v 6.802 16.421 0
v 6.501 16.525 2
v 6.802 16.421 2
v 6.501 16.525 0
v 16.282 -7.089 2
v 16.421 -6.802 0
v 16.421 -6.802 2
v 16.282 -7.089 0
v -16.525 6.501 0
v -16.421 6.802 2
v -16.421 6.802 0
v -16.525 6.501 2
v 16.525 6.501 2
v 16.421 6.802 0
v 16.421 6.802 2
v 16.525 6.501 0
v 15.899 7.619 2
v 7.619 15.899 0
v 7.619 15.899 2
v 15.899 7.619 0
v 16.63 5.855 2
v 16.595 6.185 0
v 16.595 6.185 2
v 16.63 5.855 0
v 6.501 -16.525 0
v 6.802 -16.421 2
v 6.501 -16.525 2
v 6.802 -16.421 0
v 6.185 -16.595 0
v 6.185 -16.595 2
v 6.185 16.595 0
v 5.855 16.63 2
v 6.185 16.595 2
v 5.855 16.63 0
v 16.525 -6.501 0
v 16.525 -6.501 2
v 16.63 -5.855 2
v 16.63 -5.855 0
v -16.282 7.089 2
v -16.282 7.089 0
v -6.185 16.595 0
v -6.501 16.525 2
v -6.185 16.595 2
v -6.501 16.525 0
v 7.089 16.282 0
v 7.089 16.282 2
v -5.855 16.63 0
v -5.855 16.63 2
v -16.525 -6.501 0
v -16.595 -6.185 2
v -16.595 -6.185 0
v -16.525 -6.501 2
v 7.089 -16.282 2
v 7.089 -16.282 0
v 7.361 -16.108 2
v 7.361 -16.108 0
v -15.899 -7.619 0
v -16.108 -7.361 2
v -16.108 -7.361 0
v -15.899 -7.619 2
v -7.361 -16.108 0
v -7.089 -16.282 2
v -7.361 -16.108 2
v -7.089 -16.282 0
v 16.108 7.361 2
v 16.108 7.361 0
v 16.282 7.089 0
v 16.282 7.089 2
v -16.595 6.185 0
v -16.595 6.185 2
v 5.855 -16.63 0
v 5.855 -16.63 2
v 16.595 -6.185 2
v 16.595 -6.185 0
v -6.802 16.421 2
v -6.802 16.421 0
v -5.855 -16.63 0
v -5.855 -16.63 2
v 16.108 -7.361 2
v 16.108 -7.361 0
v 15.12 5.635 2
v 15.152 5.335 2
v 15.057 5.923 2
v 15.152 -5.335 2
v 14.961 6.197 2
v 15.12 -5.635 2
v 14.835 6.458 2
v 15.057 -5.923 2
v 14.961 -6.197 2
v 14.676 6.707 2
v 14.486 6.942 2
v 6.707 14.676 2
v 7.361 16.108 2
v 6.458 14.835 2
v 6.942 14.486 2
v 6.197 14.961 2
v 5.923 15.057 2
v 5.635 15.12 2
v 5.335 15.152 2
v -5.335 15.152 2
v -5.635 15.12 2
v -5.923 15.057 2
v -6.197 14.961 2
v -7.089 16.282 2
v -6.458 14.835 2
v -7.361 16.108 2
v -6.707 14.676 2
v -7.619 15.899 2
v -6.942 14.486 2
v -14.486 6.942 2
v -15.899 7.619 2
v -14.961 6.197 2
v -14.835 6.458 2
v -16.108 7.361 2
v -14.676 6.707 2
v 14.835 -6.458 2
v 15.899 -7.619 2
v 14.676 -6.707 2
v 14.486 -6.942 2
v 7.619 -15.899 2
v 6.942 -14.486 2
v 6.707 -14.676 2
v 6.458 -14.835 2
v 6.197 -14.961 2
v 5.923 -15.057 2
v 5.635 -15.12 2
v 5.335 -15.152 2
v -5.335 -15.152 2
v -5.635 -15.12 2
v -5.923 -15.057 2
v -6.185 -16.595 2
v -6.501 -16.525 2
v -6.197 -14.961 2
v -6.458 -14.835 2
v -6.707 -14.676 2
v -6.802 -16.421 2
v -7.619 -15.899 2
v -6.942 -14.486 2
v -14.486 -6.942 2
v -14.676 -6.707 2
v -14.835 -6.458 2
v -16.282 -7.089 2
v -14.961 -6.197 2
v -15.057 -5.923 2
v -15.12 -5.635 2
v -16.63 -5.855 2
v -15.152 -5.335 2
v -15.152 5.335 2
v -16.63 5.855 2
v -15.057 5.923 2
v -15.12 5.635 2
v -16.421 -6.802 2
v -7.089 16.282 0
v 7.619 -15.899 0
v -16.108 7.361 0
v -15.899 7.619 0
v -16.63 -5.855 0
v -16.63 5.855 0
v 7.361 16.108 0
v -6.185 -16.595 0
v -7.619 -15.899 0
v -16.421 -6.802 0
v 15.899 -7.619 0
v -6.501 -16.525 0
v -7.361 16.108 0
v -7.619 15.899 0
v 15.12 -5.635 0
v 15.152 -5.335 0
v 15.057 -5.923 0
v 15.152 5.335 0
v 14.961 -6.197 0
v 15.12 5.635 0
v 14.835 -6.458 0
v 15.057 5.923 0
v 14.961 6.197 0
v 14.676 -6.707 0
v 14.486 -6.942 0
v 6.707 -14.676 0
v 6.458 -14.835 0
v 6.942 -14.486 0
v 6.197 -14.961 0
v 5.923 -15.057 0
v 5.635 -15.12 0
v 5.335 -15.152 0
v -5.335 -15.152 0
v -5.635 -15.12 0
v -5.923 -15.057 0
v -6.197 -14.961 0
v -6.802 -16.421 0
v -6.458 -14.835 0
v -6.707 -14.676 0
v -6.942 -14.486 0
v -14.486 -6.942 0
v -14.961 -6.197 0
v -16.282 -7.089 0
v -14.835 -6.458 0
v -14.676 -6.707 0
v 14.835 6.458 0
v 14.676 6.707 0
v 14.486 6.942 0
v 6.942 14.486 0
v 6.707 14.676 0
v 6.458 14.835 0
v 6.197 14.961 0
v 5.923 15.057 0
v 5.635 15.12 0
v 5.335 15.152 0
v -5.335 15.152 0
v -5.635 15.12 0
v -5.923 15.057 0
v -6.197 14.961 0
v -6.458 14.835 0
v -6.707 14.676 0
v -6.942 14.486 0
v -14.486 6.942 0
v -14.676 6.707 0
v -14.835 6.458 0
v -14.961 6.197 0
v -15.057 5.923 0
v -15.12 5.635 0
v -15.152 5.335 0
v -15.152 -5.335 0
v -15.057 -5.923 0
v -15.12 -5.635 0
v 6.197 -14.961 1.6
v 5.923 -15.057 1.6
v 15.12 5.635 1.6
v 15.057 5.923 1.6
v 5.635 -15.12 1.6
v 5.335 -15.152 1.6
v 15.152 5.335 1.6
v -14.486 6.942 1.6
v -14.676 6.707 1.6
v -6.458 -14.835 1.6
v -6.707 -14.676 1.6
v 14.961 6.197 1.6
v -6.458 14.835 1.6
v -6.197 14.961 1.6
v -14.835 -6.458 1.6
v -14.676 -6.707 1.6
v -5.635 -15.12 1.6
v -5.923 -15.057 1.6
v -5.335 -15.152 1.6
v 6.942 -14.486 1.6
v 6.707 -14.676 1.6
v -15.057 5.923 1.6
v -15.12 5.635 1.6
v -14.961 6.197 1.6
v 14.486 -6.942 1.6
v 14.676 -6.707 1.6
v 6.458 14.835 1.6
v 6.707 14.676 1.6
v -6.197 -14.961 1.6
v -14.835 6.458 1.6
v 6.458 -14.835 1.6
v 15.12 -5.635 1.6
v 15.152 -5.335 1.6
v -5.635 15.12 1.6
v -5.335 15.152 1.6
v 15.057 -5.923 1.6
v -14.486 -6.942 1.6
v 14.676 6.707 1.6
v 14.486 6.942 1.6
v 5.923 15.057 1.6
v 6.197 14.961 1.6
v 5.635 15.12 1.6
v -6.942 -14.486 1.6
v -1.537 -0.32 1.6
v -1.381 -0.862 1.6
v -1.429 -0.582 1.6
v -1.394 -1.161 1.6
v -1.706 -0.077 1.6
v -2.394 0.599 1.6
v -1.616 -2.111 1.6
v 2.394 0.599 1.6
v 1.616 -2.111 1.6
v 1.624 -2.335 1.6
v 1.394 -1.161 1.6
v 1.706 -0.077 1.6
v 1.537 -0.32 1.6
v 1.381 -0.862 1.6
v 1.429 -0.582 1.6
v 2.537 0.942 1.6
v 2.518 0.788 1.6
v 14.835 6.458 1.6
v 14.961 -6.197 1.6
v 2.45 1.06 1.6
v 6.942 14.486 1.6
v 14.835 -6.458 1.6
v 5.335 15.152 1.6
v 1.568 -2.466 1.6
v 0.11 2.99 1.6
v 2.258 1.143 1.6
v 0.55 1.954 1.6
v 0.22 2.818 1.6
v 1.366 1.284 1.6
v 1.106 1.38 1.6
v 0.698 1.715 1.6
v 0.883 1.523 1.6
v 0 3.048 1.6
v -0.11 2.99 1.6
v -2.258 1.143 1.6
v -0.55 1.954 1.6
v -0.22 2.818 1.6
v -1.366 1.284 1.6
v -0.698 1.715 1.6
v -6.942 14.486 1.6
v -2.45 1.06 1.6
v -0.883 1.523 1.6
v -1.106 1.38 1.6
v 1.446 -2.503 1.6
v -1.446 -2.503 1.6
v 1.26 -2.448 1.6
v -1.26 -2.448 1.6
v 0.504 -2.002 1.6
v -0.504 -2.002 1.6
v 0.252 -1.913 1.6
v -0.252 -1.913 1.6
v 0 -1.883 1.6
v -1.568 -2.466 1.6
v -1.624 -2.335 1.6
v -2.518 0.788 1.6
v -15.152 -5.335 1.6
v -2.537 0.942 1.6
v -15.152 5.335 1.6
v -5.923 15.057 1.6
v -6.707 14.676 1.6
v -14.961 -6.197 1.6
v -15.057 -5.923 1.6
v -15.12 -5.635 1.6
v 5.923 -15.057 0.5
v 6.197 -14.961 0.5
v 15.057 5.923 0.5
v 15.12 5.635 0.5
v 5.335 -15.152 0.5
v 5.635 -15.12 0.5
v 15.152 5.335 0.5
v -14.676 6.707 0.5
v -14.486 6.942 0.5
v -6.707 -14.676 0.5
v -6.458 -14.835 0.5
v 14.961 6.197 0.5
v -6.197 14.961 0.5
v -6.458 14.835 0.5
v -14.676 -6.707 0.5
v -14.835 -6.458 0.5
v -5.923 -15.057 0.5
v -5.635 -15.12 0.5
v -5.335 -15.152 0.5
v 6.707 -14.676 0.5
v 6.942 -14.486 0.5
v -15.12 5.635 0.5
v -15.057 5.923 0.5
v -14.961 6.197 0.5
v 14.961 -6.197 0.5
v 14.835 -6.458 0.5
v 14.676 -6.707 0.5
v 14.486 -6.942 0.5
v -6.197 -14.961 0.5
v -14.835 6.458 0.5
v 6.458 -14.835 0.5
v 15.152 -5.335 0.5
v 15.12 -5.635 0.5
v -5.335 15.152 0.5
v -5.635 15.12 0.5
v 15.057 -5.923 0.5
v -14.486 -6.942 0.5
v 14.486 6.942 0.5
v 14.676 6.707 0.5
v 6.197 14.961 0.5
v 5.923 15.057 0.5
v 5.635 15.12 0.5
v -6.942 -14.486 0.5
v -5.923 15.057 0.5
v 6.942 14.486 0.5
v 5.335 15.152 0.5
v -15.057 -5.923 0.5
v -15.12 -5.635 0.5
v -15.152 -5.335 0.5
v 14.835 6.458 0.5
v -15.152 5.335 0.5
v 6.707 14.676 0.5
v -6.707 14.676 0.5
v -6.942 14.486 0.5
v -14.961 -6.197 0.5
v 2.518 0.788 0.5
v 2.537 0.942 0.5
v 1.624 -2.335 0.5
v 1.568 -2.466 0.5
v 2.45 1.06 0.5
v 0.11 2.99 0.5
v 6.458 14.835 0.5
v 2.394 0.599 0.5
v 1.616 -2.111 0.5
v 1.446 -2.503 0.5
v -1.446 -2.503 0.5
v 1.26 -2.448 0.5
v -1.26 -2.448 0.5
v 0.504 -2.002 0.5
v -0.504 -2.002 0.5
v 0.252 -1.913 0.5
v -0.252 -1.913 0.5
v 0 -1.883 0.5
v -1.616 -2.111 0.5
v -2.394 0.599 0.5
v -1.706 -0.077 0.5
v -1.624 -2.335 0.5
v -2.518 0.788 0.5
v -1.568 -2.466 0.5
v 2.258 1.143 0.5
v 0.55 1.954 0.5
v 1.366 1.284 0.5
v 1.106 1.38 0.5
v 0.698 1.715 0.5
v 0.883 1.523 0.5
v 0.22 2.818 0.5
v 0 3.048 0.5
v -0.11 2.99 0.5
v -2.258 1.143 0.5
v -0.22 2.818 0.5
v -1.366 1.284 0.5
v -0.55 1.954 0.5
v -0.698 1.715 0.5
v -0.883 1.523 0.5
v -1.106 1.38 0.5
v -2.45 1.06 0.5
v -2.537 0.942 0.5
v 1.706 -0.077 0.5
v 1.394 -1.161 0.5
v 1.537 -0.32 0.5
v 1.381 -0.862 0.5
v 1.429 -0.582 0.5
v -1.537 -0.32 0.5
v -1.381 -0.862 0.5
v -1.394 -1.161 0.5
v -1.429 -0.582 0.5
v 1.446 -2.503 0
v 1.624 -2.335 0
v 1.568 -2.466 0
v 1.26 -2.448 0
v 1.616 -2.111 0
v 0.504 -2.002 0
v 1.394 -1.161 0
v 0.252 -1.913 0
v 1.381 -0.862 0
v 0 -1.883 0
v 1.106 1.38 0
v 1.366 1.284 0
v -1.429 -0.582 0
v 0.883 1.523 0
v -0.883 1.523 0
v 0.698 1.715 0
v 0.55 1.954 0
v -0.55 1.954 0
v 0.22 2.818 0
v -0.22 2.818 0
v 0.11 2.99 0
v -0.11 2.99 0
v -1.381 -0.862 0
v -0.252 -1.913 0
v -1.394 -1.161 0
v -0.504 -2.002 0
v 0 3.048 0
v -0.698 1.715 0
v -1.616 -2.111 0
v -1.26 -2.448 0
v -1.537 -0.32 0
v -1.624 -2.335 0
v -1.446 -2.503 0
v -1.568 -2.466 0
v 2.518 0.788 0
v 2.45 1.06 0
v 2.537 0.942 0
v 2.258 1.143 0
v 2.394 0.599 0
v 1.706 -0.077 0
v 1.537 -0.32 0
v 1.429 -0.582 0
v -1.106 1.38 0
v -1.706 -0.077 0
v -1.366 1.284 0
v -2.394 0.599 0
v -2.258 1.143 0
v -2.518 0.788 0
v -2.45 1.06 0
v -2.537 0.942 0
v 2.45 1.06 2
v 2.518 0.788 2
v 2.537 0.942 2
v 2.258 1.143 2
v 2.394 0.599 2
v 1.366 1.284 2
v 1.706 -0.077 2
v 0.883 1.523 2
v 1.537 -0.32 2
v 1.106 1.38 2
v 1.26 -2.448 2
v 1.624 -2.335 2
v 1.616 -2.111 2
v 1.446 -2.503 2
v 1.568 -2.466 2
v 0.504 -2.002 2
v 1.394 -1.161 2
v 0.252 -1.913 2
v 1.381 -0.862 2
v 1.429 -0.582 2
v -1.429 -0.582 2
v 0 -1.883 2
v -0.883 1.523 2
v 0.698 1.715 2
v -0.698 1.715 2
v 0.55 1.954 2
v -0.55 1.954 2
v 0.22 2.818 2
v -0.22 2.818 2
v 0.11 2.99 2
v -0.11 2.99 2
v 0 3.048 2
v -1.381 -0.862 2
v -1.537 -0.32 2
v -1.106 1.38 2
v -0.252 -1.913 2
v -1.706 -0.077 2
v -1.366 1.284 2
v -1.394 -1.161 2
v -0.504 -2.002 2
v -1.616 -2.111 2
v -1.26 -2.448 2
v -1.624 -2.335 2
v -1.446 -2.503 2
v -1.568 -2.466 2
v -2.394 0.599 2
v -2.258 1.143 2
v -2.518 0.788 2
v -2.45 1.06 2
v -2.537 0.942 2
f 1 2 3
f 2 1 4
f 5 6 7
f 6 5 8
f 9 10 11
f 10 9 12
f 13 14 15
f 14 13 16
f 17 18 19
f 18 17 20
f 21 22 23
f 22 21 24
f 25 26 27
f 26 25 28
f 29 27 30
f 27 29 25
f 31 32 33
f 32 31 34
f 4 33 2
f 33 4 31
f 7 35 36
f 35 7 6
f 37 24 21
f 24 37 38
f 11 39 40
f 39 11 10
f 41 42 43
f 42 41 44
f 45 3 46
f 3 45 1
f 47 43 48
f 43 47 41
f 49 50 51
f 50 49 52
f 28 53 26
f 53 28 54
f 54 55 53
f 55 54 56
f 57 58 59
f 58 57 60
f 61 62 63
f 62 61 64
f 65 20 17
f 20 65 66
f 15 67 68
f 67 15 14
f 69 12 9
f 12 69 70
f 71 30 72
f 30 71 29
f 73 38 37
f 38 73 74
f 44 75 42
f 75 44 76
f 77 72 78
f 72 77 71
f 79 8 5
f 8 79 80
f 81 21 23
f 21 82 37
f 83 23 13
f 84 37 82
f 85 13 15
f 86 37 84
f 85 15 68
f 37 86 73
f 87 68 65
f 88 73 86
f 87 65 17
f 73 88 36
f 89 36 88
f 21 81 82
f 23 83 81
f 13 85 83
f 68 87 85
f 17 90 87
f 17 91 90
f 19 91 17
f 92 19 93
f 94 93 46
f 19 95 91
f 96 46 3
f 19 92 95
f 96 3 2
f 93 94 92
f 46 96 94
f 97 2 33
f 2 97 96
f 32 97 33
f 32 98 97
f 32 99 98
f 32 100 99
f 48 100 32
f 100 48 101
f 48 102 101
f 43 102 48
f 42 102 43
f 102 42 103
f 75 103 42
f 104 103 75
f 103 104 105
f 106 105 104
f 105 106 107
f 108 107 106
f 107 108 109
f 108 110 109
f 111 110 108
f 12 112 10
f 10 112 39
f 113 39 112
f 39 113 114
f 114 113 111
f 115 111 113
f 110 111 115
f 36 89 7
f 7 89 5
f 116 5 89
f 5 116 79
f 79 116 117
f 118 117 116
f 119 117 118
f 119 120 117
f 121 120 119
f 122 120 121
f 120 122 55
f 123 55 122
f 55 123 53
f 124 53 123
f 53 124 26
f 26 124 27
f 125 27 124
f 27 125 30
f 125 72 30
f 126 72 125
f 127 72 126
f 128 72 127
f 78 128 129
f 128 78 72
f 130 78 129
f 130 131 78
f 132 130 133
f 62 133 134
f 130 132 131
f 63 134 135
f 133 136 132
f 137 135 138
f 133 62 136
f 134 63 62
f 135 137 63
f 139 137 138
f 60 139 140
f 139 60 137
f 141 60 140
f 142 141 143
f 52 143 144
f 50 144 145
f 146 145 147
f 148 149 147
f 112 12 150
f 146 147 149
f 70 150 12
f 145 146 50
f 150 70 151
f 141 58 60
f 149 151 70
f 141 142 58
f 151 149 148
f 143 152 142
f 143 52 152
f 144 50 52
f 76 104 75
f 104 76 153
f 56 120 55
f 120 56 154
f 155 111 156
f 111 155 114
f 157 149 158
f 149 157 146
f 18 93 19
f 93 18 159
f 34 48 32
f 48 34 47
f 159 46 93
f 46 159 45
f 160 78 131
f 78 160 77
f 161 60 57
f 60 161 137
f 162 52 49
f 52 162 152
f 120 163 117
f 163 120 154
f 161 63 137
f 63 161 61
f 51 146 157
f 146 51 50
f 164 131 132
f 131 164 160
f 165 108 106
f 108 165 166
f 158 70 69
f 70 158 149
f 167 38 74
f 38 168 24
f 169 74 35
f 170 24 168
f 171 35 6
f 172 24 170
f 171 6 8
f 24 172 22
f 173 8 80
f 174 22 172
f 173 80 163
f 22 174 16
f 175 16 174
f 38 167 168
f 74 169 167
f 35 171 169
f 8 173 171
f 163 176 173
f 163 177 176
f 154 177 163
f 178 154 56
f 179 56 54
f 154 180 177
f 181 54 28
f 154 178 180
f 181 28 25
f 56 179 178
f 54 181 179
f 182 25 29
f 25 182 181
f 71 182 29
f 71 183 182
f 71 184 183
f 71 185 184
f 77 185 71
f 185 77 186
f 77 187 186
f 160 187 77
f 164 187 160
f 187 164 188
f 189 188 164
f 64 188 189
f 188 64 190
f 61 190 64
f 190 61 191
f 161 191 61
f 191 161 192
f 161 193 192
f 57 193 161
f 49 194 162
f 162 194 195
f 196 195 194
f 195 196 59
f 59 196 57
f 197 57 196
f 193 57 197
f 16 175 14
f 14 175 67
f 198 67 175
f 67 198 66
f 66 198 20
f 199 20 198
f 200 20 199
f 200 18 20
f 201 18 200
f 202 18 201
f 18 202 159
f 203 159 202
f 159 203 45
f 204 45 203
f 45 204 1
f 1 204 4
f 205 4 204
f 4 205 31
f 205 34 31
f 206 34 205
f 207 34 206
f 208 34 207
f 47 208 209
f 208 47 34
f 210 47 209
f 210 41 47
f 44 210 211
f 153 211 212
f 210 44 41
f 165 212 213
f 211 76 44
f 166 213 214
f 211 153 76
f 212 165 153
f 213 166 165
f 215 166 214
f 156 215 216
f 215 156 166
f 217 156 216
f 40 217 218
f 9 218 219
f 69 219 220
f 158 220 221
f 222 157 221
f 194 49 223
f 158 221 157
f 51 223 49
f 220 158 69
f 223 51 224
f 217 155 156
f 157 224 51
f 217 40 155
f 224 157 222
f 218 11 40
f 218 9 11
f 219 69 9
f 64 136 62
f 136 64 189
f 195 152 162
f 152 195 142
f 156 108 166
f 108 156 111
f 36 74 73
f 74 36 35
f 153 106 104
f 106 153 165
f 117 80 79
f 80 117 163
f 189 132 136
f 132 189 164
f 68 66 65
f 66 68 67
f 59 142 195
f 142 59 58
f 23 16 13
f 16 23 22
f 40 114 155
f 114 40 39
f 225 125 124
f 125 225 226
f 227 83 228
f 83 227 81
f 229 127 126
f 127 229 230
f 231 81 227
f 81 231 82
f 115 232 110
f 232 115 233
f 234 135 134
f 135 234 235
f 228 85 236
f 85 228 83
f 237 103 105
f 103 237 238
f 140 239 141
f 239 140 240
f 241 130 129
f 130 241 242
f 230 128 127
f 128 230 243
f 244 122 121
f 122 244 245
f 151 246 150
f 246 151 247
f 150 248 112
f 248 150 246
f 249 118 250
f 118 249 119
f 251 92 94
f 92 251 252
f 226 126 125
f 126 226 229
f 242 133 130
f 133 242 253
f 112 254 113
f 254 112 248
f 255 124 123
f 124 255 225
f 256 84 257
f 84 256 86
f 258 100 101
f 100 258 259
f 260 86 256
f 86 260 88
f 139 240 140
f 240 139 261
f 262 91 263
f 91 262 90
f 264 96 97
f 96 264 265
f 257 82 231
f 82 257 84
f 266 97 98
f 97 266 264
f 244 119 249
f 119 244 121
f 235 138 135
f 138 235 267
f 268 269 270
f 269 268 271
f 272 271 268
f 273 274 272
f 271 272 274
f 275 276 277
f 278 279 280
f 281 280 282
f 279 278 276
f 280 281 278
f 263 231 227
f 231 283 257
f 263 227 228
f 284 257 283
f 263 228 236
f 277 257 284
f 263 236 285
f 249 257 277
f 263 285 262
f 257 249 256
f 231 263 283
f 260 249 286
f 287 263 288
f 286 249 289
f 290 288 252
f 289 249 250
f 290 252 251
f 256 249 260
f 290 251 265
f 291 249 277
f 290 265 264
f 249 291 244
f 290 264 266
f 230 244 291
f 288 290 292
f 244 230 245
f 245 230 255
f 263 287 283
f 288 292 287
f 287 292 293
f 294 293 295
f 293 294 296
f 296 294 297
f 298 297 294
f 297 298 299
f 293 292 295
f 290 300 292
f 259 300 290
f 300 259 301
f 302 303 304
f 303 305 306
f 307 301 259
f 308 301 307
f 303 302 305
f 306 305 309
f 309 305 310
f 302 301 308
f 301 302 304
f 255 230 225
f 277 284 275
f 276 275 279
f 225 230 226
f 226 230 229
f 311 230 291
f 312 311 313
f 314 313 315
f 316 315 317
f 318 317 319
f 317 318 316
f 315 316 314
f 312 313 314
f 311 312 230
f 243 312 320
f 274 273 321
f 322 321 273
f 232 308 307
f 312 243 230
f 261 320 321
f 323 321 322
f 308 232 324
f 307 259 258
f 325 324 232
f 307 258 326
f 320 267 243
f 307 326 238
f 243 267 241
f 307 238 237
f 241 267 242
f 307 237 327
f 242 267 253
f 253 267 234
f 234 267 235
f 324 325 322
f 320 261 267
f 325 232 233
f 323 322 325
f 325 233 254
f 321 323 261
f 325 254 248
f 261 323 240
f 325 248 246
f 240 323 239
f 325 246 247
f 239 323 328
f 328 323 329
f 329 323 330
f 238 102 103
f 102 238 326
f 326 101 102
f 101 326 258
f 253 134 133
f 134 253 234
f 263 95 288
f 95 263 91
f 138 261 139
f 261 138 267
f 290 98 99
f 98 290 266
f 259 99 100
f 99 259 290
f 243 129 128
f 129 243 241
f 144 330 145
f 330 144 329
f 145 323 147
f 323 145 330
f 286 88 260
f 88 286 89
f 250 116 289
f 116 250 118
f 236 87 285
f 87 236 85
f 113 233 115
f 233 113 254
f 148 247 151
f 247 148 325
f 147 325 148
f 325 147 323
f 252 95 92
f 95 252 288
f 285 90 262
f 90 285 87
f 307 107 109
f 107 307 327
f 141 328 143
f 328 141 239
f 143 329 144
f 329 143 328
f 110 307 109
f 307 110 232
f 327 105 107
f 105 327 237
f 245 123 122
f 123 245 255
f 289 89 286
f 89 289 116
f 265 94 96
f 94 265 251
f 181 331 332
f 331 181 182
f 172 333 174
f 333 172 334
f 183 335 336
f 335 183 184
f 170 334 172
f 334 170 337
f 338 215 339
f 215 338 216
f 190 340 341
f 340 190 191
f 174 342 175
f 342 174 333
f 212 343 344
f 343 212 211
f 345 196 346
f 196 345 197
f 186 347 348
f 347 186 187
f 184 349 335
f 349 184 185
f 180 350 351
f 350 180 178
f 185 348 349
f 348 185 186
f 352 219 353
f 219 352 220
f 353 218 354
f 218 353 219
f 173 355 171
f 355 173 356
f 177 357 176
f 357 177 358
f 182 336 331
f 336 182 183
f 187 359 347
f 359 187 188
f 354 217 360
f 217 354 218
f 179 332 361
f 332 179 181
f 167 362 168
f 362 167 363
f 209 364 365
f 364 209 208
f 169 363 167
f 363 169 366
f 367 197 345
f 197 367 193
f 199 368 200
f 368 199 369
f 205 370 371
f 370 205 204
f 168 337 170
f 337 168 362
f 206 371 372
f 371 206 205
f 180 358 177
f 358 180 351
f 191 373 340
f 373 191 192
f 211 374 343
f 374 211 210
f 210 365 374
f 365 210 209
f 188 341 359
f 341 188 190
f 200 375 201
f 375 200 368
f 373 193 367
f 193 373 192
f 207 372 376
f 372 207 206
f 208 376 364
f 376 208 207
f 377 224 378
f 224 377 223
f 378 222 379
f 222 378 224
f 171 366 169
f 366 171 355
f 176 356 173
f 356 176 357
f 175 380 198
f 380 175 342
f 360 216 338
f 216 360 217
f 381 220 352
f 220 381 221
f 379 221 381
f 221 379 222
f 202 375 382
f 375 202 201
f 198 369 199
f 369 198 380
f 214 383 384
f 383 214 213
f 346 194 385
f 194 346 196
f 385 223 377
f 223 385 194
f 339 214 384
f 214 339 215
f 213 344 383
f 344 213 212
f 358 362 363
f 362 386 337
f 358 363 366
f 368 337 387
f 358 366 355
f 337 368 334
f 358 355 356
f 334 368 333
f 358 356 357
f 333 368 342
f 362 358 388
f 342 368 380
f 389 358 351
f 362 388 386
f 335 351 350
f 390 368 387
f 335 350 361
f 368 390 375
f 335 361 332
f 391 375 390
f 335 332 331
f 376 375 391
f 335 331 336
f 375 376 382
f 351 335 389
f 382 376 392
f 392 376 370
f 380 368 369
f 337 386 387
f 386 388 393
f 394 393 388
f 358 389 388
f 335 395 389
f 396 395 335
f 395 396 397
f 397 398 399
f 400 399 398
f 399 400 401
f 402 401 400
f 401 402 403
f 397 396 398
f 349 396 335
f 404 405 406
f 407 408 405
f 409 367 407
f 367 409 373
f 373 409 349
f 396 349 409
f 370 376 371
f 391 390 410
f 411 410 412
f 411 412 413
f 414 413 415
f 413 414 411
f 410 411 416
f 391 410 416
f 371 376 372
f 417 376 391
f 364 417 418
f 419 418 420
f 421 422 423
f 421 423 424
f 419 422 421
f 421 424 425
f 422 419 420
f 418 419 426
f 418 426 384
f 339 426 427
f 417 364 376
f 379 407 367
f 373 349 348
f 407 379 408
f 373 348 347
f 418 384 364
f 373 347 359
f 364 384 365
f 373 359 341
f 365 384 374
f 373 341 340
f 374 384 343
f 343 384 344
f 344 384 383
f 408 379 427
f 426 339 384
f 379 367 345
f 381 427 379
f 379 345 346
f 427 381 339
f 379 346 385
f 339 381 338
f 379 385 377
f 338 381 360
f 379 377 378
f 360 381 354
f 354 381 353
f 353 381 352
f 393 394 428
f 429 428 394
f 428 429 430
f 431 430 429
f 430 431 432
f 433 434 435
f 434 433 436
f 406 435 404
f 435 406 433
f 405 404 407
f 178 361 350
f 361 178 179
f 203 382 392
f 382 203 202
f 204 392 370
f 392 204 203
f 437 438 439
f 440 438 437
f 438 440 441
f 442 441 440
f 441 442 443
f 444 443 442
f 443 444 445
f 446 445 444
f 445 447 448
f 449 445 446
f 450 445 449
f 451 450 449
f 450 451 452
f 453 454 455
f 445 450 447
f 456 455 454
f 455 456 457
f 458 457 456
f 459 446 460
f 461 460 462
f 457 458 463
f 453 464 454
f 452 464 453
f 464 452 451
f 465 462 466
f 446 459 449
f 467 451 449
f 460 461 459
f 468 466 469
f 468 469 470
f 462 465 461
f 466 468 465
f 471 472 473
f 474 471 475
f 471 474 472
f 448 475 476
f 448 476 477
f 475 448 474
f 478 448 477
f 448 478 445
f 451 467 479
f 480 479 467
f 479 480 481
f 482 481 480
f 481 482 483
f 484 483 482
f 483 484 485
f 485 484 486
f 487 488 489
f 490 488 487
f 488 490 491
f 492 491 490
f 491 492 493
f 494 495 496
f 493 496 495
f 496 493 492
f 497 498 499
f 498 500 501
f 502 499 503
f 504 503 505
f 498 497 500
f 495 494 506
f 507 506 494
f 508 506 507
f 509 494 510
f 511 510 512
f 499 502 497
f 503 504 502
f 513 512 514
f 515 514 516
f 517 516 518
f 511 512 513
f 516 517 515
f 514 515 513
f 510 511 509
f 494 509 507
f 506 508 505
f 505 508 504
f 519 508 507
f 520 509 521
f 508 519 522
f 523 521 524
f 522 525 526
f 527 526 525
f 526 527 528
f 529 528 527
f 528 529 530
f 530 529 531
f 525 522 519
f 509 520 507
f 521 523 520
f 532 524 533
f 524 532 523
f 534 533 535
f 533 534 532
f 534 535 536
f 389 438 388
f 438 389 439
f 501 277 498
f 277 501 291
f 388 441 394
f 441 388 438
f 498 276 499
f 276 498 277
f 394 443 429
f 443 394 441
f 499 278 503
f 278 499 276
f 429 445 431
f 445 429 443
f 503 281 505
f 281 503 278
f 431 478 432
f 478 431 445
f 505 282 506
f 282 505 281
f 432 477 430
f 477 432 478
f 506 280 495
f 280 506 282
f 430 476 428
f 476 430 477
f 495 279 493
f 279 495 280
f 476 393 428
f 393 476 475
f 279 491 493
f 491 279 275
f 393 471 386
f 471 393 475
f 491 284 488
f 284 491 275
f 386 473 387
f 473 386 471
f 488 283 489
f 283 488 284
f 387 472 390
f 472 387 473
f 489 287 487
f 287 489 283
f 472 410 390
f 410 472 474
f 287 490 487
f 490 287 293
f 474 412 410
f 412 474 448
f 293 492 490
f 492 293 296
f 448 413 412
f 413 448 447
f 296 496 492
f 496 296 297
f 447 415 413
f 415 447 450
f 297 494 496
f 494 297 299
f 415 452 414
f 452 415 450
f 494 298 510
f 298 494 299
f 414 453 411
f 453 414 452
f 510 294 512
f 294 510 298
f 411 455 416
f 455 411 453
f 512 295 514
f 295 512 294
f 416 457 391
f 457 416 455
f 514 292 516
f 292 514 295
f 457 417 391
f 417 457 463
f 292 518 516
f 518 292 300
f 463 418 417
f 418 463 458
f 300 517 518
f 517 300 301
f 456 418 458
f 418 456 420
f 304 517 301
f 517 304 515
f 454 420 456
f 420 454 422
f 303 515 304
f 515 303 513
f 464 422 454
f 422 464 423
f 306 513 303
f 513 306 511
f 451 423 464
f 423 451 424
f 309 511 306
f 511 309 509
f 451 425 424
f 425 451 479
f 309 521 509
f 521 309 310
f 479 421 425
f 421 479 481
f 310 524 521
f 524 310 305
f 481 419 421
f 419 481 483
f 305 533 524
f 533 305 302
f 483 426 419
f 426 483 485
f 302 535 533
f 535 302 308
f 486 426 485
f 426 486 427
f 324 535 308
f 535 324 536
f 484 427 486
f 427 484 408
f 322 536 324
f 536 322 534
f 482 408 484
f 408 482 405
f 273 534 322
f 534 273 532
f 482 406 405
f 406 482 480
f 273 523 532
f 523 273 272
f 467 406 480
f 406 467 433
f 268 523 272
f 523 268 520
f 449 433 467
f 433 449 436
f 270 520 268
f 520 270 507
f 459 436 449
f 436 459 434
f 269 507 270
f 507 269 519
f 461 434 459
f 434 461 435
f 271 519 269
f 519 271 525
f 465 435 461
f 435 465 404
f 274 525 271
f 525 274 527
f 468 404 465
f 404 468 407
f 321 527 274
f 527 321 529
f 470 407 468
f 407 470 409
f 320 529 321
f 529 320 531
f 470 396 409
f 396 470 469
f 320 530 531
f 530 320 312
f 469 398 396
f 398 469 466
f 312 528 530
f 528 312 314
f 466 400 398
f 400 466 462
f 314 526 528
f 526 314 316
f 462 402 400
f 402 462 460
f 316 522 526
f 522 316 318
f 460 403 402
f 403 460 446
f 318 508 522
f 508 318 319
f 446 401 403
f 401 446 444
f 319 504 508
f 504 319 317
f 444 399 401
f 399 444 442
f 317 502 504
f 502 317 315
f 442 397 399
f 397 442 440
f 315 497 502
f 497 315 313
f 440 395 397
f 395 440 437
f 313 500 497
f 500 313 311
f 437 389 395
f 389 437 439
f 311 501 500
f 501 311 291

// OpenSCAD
/* [Outer] */

//Outer radius of the coin, the size will be roughly 2 times this value depending on other settings.
outer_radius = 18;

//Forms an ellipse instead of a circle by playing this parameter
outer_radius_shape = 1;

//Height of the coin without borders
height = 1;

//The number of sides on the outer edge of the coin. Set to a very high value to make it circular. Values 2 and higher will create meaningful shapes.
outer_sides = 4;

//Type of the outer border. Not all star shapes can be 2 and 3 regular.
outer_mod = 2; //[0:Polygon, 1: Custom, 2: 2-regular star, 3: 3-regular star]

//This parameter controls the distance of the dents that makes the outer shape. Used if the type is set to Custom. Setting this value to 1 will make the shape a polygon.
outer_shape = 1;

//Width of the outer border, set 0 to disable. If outer border is disabled and inner border is enabled, part will either need support or bottom_border should be disabled as well.
outer_border = 1.6;

//Height of the outer borders. Keep inner and outer borders are synchronized, otherwise the part will need support.
outer_border_height = 0.5;

//Rotates the outer border in multiples of half sides
outer_rotation = 0.5;

//Whether to create bottom border. If the settings check out, the bottom part will be bridged. If you have trouble printing the part, or changed border settings to a point where bridging is not possible, then disabling this might help.
bottom_border = 1;//[1:Yes,0:No]

/* [Inner] */

//Radius of the inner hole, excluding the inner border. Set 0 to disable.
inner_radius = 3;

//Forms an ellipse instead of a circle by playing this parameter
inner_radius_shape = 1.3;

//Sides of the inner hole of the coin. Set to a very high value to make it circular. Values 2 and higher will create meaningful shapes.
inner_sides = 5;

//Type of the inner border. Not all star shapes can be 2 and 3 regular.
inner_mod = 2; //[0:Polygon, 1: Custom, 2: 2-regular star, 3: 3-regular star]

//This parameter controls the distance of the dents that makes the inner shape. Used if the type is set to Custom. Setting this value to 1 will make the shape a polygon.
inner_shape = 0.98;

//Radius of the border around the hole, set 0 to disable. If inner border is disabled, outer border is enabled and the inner radius is non-zero, part will either need support or bottom_border should be disabled as well.
inner_border = 3;

//Height of the inner border in terms of the outer border height. Keep this value 1 or disable bottom_border, otherwise the part will need support.
inner_border_height = 1;

//Rotates the inner border in multiples of half sides
inner_rotation = -0.5;

//Only add a border for innersection, no 
inner_border_only = 0;//[1:Yes,0:No]

//Offset the inner hole sideways
inner_offset_x = 0;

//Offset the inner hole up and down
inner_offset_y = 0;

/* [Top text] */
//The text that will be displayed on top of the coin, remember to change bottom text as they are not the same.
top_text = "";

//Second text is rendered below the first one, it will be offset the same amount as the first but to the other direction. Thus if the offset is 0, they will be on top of each other.
second_top_text = "";

//Size of the text, roughly its height
text_size = 5;

//Size of the second text, roughly its height
second_text_size = 4;

//Offset of the text away from the center. Negative offsets work.
text_offset_y = 6;

//Offset of the second text away from the center. Negative offsets work.
second_text_offset_y = -.5;

//Offset of the text to the sideways
text_offset_x = -8;

//Offset of the second text to the sideways
second_text_offset_x = -8;

//How many times the text will be repeated around the coin
text_repeat = 2;


/* [Bottom text] */
//The text that will be displayed on top of the coin
bottom_text = "";

//Second text is rendered below the first one, it will be offset the same amount as the first but to the other direction. Thus if the offset is 0, they will be on top of each other.
second_bottom_text = "";

//Size of the text, roughly its height
bottom_text_size = 4;

//Size of the second text, roughly its height
second_bottom_text_size = 4;

//How many times the text will be repeated around the coin
bottom_text_repeat = 8;

//Offset of the text away from the center. Negative offsets work.
bottom_text_offset_y = 12;

//Offset of the second text away from the center. Negative offsets work.
second_bottom_text_offset_y = 0;

//Offset of the text to the sideways
bottom_text_offset_x = 0;

//Offset of the second text to the sideways
second_bottom_text_offset_x = 0;


/* [Text settings] */

//Height of the text in terms of outer border
text_height = 1;

//Font that will be used to render the text
text_font = "Nunito Sans"; //[Helvetica,Times,Oxygen,Lobster,Pacifico,Nunito Sans,Roboto Mono,Anton,Cabin,Bree Sherif,Cairo,Source Serif Pro,Kanit,Josefin Slab,Cinzel,Julius Sans One,Russo One,Concert One,Orbitron,Kaushan Script,Katibeh,Alfa Slab One,Audiowide,Luckiest Guy,Sigmar One,Press Start 2P,Bowlby One SC,Sedgwick Ave Display,Baloo Chettan,Candal,Carter One,Jockey One,Rammetto One,Bungee Inline,Titan One,Slackey,Lemon,Germania One,Ranchers,Caesar Dressing]

text_style = 1; //[0:Regular, 1:Bold, 2:Italic, 3: Bold Italic]

//rotates the text around, this is per half rotations
text_rotation = 0;

//rotates the text around, this is per half rotations
second_text_rotation = 0;

/* [Smoothing] */
//Divides the lines in the outer edge of the coin, this allows smoothing to smooth locally. Set 1 to not to divide lines. Increase both subdivisions and smooth to make rounded corners softer.
outer_subdivisions = 40;

//Smooths the corners in the outer edge. Set 0 to remove smoothing. Increase to enlarge the effect of smoothing. Generally you should keep this value less then outer subdivisions. If the values are equal you will have a circle.
outer_smooth = 3;

//Divides the lines in the inner edge of the coin, this allows smoothing to smooth locally. Set 1 to not to divide lines. Increase to make rounded corners softer. Increase both subdivisions and smooth.
inner_subdivisions = 7;

//Smooths the corners in the inner edge. Set 0 to remove smoothing. Increase to enlarge the effect of smoothing. Generally you should keep this value less then inner subdivisions. If the values are equal you will have a circle.
inner_smooth = 2;

/* [hidden] */

function pmod(v, mod) = v%mod < 0 ? v%mod + mod : v%mod;

function subdivide(in, times) = 
    let(inlen = len(in))
    [for(i=[0:inlen-1]) for(j=[0:times-1]) 
        (in[pmod(i+1, inlen)] - in[i]) * j/times + in[i]
    ]
;

function sum(in, p, to) = p == to+1 ? [for(i=in[0]) 0] : sum(in, p+1, to) + in[pmod(p, len(in))];

function average(in, from, to) = sum(in, from, to) / (to - from + 1);

function smooth(in, n) = 
    let(inlen = len(in))
    [for(i=[0:inlen-1])
        average(in, i-n, i+n)
    ]
;
        
    
function star(r_out, r_in, sides, shape = 1, angle_off = 0) = 
    let(a = 360 / (sides*2))
    [for(i = [0:(sides*2-1)]) 
        let(rx = i%2 ? r_out : r_in, ry = i%2 ? r_out - r_in + (r_in * shape) : r_in * shape)
        [cos(a*i+angle_off) * rx, sin(a*i+angle_off) * ry]];
    
function ngon(r, sides) = star(r, r, sides / 2);
    
function star_inner(sides, mod, custom) = 
    mod   == 0  ? cos(180/sides) :
    mod   == 1  ? custom * cos(180/sides) :
    sides == 5  ? 0.5 * sqrt(3 - sqrt(5)) :
    sides == 6  ? sqrt(3) / 3 :
    sides == 8  ? (
             mod == 2 ? sqrt(2 - sqrt(2)) 
                      : sin(22.5*3) - sin(22.5) ):
    sides == 10 ? (
             mod == 2 ? sqrt( (5+sqrt(5)) / 10 )
                      : sqrt(5 - 2*sqrt(5)) ):
    sides == 12 ? (
             mod == 2 ? sqrt(2) * (3-sqrt(3)) / 2
                      : sqrt(6) / 3 ):
    custom
;

difference() {
    //rotate([0, 0, outer_rotation * 360 / outer_sides / 2])
    linear_extrude(
        height = height + outer_border_height + bottom_border * outer_border_height, 
        convexity=8)
    polygon(smooth(subdivide(
        star(outer_radius, 
             outer_radius * star_inner(outer_sides, outer_mod, outer_shape), 
             outer_sides, outer_radius_shape, outer_rotation * 360 / outer_sides / 2
        )
    , outer_subdivisions), outer_smooth));

    outer_border_shape = 1 + 
        ((outer_radius_shape - 1) * outer_radius) / (outer_radius - outer_border);
    
    //rotate([0, 0, outer_rotation * 360 / outer_sides / 2])
    translate([0,0,height + (bottom_border * outer_border_height) + 0.1])
    linear_extrude(height = outer_border_height + 0.1, convexity=8)
    polygon(smooth(subdivide(
        star(outer_radius - outer_border, 
             (outer_radius - outer_border) *
                star_inner(outer_sides, outer_mod, outer_shape), 
             outer_sides, outer_border_shape, outer_rotation * 360 / outer_sides / 2
        )
    , outer_subdivisions), outer_smooth));
    
    if(bottom_border) {
        //rotate([0, 0, outer_rotation * 360 / outer_sides / 2])
        translate([0,0,-0.1])
        linear_extrude(height = outer_border_height + 0.1, convexity=8)
        polygon(smooth(subdivide(
            star(outer_radius - outer_border, 
                 (outer_radius - outer_border) *
                    star_inner(outer_sides, outer_mod, outer_shape), 
                 outer_sides, outer_border_shape, outer_rotation * 360 / outer_sides / 2
            )
        , outer_subdivisions), outer_smooth));
    }
 
    inner_border_shape = 1 + 
        ((inner_radius_shape - 1) * inner_radius) / (inner_radius - inner_border);
   
    if(inner_radius > inner_border && !inner_border_only) {
        translate([inner_offset_x,inner_offset_y,0])
        //rotate([0, 0, inner_rotation * 360 / inner_sides / 2])
        translate([0,0,-0.1])
        linear_extrude(
            height = height + outer_border_height * inner_border_height * 2 + 0.2, 
            convexity=8)
        polygon(smooth(subdivide(
            star(inner_radius - inner_border, 
                 (inner_radius - inner_border) * 
                    star_inner(inner_sides, inner_mod, inner_shape), 
                 inner_sides, inner_border_shape, inner_rotation * 360 / inner_sides / 2
            )
        ,inner_subdivisions),inner_smooth));
    }
}

if(inner_radius > 0)
difference() {
    inner_border_shape = 1 + 
        ((inner_radius_shape - 1) * inner_radius) / (inner_radius - inner_border);
    
    translate([inner_offset_x,inner_offset_y,0])
    //rotate([0, 0, inner_rotation * 360 / inner_sides / 2])
    linear_extrude(
        height = height + outer_border_height * inner_border_height + bottom_border * 
        outer_border_height * inner_border_height, 
        convexity=8)
    polygon(smooth(subdivide(
        star(inner_radius, 
             inner_radius * star_inner(inner_sides, inner_mod, inner_shape), 
             inner_sides, inner_radius_shape, inner_rotation * 360 / inner_sides / 2
        )
    ,inner_subdivisions),inner_smooth));
    
    
    if(inner_radius > inner_border) {
        translate([inner_offset_x,inner_offset_y,0])
        //rotate([0,0, inner_rotation * 360 / inner_sides / 2])
        translate([0,0,-0.1])
        linear_extrude(height = height + outer_border_height * inner_border_height * 2 + 0.2, convexity=8)
        polygon(smooth(subdivide(
            star(inner_radius - inner_border, 
                 (inner_radius - inner_border) * 
                    star_inner(inner_sides, inner_mod, inner_shape), 
                 inner_sides, inner_border_shape, inner_rotation * 360 / inner_sides / 2
            )
        ,inner_subdivisions),inner_smooth));
    }
}

text_stylenames = ["", ":style=Bold", ":style=Italic", ":style=Bold Italic"];

font_string = str(text_font, text_stylenames[text_style]);


ang = 360 / text_repeat;
for(i=[0:text_repeat-1]) {

    rotate([0,0,(i+text_rotation/2)*ang])
    translate([text_offset_x, text_offset_y, text_height * outer_border_height + height - 0.1])
    linear_extrude(height = text_height * outer_border_height + 0.1)
    text(text = top_text, size = text_size, 
         font = font_string,
         halign = "center", valign = "center");
    

    rotate([0,0,(i+second_text_rotation/2)*ang])
    translate([second_text_offset_x, -second_text_offset_y, text_height * outer_border_height + height - 0.1])
    linear_extrude(height = text_height * outer_border_height + 0.1)
    text(text = second_top_text, size = second_text_size, 
         font = font_string,
         halign = "center", valign = "center");
}

bang = 360 / bottom_text_repeat;
for(i=[0:bottom_text_repeat-1]) {
    rotate([0,0,(i+text_rotation/2)*bang])
    translate([-bottom_text_offset_x, bottom_text_offset_y, 0])
    mirror(1,0,0)
    linear_extrude(height = text_height * outer_border_height + 0.1)
    text(text = bottom_text, size = bottom_text_size, 
         font = font_string,
         halign = "center", valign = "center");

    
    rotate([0,0,(i+second_text_rotation/2)*bang])
    translate([-second_bottom_text_offset_x, -second_bottom_text_offset_y, 0])
    mirror(1,0,0)
    linear_extrude(height = text_height * outer_border_height + 0.1)
    text(text = second_bottom_text, size = second_bottom_text_size, 
         font = font_string,
         halign = "center", valign = "center");

}

   
